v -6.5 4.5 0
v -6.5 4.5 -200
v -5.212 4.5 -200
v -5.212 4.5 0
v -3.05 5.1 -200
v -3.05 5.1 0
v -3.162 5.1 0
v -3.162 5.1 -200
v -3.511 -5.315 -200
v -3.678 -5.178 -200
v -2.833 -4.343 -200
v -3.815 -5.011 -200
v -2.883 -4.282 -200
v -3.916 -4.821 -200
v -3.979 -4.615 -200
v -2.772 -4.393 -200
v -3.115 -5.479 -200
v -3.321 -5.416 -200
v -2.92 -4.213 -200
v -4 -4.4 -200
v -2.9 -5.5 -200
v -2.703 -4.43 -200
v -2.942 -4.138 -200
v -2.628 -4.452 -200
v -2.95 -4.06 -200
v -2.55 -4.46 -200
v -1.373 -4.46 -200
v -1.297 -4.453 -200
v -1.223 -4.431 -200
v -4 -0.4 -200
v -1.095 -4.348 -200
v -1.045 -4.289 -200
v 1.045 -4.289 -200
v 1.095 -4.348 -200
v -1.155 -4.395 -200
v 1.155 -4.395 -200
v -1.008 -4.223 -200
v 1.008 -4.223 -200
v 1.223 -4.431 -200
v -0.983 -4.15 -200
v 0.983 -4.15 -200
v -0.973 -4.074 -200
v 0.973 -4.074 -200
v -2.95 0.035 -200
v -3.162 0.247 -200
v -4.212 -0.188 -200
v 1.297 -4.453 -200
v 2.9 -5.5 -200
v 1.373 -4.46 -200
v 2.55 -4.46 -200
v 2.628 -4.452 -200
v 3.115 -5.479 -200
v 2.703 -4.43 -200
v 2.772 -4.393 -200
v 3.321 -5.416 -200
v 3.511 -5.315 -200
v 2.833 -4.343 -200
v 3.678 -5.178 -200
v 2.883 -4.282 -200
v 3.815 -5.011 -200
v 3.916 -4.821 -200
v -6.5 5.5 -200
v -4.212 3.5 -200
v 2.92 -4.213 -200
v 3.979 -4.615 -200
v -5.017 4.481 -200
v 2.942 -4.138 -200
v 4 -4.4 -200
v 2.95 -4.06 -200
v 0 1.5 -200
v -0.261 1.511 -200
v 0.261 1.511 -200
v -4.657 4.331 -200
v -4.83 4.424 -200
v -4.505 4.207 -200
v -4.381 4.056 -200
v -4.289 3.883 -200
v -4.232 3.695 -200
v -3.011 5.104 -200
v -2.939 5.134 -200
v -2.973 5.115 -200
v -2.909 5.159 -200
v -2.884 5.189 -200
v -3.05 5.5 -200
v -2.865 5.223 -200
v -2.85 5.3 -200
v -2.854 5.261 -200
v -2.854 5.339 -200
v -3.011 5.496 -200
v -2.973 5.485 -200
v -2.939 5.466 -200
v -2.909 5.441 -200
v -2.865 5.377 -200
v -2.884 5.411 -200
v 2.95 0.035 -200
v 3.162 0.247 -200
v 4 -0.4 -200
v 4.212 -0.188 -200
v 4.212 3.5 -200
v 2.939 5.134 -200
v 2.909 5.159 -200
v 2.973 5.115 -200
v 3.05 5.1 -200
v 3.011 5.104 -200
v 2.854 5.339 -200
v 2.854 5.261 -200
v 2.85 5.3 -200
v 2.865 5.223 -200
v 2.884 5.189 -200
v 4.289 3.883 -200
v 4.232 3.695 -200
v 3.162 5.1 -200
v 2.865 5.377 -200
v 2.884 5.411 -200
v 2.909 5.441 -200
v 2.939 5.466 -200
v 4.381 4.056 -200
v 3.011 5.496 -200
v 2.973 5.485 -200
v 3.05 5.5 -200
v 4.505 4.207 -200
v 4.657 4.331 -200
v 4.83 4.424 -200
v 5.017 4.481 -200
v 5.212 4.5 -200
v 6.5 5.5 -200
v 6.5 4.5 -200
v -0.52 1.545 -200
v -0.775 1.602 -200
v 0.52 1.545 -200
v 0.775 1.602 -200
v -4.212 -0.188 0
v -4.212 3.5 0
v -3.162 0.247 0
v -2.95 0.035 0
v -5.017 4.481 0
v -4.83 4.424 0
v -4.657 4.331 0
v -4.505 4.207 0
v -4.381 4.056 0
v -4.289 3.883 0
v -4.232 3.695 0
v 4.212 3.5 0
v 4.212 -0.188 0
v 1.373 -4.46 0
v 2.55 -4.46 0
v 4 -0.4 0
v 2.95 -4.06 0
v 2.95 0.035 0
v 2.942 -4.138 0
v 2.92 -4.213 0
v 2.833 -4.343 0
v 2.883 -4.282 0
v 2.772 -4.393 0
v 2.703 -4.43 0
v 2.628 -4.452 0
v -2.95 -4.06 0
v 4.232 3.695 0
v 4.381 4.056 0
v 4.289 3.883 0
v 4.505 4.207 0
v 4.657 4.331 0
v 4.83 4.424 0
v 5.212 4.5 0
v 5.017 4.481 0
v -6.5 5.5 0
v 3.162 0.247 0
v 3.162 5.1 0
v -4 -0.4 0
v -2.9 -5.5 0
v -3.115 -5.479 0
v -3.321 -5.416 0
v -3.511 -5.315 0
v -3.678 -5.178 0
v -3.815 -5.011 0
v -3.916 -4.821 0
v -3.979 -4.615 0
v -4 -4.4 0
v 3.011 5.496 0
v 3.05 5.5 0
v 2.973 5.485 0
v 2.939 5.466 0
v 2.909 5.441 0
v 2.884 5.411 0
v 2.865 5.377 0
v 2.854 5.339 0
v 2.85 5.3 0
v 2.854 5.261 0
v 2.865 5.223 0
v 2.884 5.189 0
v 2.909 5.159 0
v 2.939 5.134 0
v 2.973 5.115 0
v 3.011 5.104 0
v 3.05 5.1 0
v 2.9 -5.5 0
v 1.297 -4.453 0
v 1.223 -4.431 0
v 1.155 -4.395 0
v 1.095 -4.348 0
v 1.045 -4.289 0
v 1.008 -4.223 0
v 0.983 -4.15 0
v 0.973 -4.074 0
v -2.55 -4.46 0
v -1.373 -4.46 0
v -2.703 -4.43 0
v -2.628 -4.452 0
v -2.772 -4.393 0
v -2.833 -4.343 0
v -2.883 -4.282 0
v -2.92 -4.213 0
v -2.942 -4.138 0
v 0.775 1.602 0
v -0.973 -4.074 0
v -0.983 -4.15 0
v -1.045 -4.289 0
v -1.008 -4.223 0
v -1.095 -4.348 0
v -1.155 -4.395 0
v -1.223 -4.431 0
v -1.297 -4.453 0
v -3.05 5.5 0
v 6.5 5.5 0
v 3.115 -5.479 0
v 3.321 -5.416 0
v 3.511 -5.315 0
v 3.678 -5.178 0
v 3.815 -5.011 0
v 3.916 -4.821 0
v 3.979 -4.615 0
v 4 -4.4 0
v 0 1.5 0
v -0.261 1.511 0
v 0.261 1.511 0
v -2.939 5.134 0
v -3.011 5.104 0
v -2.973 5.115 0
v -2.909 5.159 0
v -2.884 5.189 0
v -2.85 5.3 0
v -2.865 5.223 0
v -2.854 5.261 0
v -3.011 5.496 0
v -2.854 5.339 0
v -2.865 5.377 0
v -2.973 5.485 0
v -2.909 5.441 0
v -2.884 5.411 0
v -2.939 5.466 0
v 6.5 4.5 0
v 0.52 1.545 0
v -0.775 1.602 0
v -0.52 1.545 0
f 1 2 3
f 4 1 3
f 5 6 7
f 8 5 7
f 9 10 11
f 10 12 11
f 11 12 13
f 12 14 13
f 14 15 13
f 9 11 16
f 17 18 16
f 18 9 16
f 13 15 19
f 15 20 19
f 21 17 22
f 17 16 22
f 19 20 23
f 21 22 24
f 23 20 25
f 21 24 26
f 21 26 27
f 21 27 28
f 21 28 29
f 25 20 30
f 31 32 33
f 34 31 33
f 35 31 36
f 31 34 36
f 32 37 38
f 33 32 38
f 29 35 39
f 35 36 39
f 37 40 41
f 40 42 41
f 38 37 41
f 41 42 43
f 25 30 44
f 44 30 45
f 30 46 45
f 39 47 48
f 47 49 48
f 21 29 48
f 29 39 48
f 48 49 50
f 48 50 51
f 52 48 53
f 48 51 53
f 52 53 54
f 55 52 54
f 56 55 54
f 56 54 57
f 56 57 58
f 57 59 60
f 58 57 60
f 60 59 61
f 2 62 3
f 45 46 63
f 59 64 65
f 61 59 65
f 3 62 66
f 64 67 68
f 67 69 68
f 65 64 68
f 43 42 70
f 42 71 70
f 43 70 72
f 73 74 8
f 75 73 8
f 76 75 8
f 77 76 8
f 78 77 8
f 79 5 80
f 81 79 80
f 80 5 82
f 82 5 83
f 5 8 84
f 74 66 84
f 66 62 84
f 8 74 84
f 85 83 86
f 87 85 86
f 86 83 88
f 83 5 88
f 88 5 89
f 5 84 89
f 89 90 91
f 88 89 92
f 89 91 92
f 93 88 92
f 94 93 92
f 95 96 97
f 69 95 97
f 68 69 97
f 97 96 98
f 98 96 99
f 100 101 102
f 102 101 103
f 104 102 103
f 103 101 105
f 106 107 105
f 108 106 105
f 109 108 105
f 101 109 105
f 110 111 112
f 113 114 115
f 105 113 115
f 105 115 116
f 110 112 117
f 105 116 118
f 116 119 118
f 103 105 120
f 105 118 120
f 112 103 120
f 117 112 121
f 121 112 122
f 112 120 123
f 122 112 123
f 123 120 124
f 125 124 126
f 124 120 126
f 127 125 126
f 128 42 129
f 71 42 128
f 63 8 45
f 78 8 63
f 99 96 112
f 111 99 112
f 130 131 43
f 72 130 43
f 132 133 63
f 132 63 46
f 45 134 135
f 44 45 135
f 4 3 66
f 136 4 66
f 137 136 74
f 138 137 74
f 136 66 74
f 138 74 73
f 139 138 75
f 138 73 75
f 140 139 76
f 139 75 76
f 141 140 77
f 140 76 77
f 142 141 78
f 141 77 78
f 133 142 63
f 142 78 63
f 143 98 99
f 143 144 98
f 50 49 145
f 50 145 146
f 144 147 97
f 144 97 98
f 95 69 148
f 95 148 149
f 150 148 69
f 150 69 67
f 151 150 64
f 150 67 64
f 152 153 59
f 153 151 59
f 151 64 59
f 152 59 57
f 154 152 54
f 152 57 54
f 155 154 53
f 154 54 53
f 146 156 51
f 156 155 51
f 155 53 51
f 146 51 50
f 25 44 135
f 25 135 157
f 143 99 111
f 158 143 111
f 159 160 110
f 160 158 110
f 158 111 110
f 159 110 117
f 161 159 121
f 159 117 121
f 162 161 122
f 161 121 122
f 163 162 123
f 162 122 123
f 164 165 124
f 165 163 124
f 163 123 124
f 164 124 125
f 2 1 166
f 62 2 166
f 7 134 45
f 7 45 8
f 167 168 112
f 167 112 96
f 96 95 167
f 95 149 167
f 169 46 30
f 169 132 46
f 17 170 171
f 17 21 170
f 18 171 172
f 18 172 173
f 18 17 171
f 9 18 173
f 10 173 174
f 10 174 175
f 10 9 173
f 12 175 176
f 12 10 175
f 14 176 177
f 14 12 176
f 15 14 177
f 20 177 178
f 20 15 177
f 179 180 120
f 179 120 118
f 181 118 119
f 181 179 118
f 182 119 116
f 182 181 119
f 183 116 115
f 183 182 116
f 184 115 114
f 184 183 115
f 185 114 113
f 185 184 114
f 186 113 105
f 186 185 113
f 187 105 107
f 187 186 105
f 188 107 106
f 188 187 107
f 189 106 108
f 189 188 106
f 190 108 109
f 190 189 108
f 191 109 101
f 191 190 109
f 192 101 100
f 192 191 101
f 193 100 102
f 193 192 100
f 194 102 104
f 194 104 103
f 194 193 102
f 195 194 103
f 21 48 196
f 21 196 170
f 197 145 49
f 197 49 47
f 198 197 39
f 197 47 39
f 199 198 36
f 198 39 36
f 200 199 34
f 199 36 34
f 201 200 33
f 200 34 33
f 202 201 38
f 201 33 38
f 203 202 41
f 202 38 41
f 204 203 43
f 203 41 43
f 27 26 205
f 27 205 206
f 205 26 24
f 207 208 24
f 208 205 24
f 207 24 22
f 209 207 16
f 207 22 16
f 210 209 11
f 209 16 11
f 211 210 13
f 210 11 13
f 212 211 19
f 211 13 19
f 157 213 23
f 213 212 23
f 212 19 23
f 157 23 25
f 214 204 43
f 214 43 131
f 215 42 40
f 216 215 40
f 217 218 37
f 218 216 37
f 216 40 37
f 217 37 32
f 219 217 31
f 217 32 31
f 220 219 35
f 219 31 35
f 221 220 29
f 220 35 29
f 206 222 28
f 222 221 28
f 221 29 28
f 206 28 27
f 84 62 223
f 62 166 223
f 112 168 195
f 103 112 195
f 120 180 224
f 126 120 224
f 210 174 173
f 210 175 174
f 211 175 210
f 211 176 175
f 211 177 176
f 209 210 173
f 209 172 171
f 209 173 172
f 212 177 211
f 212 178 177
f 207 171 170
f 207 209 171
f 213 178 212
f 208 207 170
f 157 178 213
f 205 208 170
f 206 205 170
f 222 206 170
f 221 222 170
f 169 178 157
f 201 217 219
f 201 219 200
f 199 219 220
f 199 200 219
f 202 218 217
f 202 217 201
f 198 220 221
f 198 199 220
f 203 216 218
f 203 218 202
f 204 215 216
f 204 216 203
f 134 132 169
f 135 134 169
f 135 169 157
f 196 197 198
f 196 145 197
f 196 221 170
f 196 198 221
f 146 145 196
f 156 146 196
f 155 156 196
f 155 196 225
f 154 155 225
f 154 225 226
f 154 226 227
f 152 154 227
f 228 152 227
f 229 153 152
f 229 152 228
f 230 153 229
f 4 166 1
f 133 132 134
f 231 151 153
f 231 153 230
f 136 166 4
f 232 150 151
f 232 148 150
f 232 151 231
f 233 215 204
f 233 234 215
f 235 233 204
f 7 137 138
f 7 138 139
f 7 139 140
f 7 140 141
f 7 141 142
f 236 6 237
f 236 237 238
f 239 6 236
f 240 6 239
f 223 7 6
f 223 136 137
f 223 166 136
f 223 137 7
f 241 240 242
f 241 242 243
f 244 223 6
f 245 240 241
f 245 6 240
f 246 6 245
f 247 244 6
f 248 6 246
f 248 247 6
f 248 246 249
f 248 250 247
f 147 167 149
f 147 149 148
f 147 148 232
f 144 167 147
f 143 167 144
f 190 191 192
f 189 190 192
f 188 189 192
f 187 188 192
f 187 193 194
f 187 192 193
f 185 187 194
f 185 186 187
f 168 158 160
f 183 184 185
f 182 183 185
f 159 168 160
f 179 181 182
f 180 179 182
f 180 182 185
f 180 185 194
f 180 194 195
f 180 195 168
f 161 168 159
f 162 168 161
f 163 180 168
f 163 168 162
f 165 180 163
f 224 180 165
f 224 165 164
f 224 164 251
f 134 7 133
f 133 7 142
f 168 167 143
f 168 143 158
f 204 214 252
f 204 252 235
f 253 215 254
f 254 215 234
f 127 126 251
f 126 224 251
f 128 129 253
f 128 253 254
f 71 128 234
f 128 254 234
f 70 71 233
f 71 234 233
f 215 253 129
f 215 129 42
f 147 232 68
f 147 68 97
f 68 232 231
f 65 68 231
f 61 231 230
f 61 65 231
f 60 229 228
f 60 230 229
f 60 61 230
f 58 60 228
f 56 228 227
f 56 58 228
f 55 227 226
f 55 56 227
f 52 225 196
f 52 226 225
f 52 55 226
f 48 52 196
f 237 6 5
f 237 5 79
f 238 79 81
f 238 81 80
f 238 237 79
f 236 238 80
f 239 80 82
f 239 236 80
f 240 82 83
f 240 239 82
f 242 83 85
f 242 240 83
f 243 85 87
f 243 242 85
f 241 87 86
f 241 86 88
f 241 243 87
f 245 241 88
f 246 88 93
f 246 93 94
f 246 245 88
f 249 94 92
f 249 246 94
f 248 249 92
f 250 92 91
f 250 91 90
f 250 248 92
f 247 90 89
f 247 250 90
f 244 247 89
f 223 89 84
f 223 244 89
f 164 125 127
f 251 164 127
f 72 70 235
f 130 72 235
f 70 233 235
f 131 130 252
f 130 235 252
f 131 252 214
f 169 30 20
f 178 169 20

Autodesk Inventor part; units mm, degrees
ref_plane "YZ Plane" through (0, 0, 0) normal (1, 0, 0) x (0, 1, 0)
ref_plane "XY Plane" through (0, 0, 0) normal (0, 0, 1) x (1, 0, 0)
sketch "Sketch1" plane through (0, 0, 0) normal (0, 0, 1) x (1, 0, 0)
  line L0 (-6.5, 5.5) -> (6.5, 5.5)
  line L1 (6.5, 5.5) -> (6.5, -5.5)
  line L2 (6.5, -5.5) -> (-6.5, -5.5)
  line L3 (-6.5, -5.5) -> (-6.5, 5.5)
  point P0 (0, 0)
  dimension "d0" = 13
  dimension "d1" = 11
  dimension "d2" = 6.5
  dimension "d3" = 5.5
extrude "Extrusion1" add sketch "Sketch1" against normal blind 200
sketch "Sketch2" plane through (0, 0, 0) normal (0, 0, 1) x (1, 0, 0)
  line L0 (-6.5, 5.5) -> (6.5, 5.5) projected
  line L1 (-6.5, -5.5) -> (-6.5, 5.5) projected
  line L2 (6.5, -5.5) -> (-6.5, -5.5) projected
  line L3 (6.5, 5.5) -> (6.5, -5.5) projected
  line L4 (-6.5, 4.5) -> (-4.2125, 4.5)
  line L5 (-4.2125, 4.5) -> (-4.2125, -0.1875)
  line L6 (-4.2125, -0.1875) -> (-4, -0.4)
  line L7 (-4, -0.4) -> (-4, -5.5)
  line L8 (0, 7.7) -> (0, -7.7) projected
  line L9 (-6.5, 4.5) -> (-6.5, -5.5)
  line L10 (-6.5, -5.5) -> (-4, -5.5)
  dimension "d6" = 1
  dimension "d7" = 8.425
  dimension "d8" = 8
  dimension "d9" = 135
  dimension "d10" = 5.1
extrude "Extrusion2" cut sketch "Sketch2" against normal through all contours L4 L5 L6 L7 L2 L1
fillet "Fillet1" radius 1 1 edges at (-4.2125, 4.5, -100)
fillet "Fillet1" radius 1.1 1 edges at (-4, -5.5, -100)
mirror "Mirror1" about plane through (0, 0, 0) normal (1, 0, 0) of "Extrusion2", "Fillet1"
sketch "Sketch3" plane through (0, 0, 0) normal (0, 0, 1) x (1, 0, 0)
  line L0 (-6.5, 5.5) -> (6.5, 5.5) projected
  line L1 (-4.2125, 3.5) -> (-4.2125, -0.1875) projected
  line L2 (-4.2125, -0.1875) -> (-4, -0.4) projected
  line L3 (-4, -0.4) -> (-4, -4.4) projected
  line L4 (2.9, -5.5) -> (-2.9, -5.5) projected
  arc A0 (-3.05, 5.1) -> (-3.05, 5.5) centre (-3.05, 5.3) ccw
  line L5 (-3.1625, 0.2474) -> (-2.95, 0.0349)
  line L6 (-2.95, 0.0349) -> (-2.95, -4.46)
  line L7 (-2.95, -4.46) -> (-0.9867, -4.46)
  line L8 (0, 7.7) -> (0, -7.7) projected
  line L9 (-3.1625, 0.2474) -> (-3.1625, 5.1)
  line L10 (-3.05, 5.1) -> (-3.1625, 5.1)
  line L11 (-0.775, 1.6018) -> (-0.9867, -4.46)
  line L12 (0, 1.5) -> (0, -5.5)
  arc A1 (-0.775, 1.6018) -> (0, 1.5) centre (0, 4.5) ccw
  line L13 (0, 1.5) -> (0, 5.5)
  line L14 (0, 5.5) -> (-3.05, 5.5)
  dimension "d15" = 0.4
  dimension "d16" = 1
  dimension "d18" = 5.7
  dimension "d19" = 1.05
  dimension "d20" = 1.05
  dimension "d21" = 1.05
  dimension "d22" = 92
  dimension "d23" = 1.04
  dimension "d24" = 1.55
  dimension "d25" = 3
extrude "Extrusion3" cut sketch "Sketch3" against normal through all
mirror "Mirror2" about plane through (0, 0, 0) normal (1, 0, 0) of "Extrusion3"
fillet "Fillet2" radius 0.4 4 edges at (-2.95, -4.46, -100) (-0.9867, -4.46, -100) (0.9867, -4.46, -100) (2.95, -4.46, -100)
ref_plane "Side1" through (-6.5, 4.5, 0) normal (0, -1, 0) x (1, 0, 0)
ref_plane "T-Slot1" through (0, 5.5, 0) normal (1, 0, 0) x (0, 0, -1)
ref_plane "Side3" through (-6.5, 5.5, 0) normal (0, 1, 0) x (-1, 0, 0)
ref_plane "Side2" through (6.5, 5.5, 0) normal (1, 0, 0) x (0, 1, 0)
ref_plane "Piano di lavoro5" through (0, 1.5, 0) normal (0, 1, 0) x (-1, 0, 0)
equation "\"d2\" = 0.5 * d0"
equation "\"d3\" = 0.5 * d1"
equation "\"d4\" = Ex_Length"
equation "\"Ex_Length\" = 200"
properties part number "13-106" material "Alluminio - 6061"
